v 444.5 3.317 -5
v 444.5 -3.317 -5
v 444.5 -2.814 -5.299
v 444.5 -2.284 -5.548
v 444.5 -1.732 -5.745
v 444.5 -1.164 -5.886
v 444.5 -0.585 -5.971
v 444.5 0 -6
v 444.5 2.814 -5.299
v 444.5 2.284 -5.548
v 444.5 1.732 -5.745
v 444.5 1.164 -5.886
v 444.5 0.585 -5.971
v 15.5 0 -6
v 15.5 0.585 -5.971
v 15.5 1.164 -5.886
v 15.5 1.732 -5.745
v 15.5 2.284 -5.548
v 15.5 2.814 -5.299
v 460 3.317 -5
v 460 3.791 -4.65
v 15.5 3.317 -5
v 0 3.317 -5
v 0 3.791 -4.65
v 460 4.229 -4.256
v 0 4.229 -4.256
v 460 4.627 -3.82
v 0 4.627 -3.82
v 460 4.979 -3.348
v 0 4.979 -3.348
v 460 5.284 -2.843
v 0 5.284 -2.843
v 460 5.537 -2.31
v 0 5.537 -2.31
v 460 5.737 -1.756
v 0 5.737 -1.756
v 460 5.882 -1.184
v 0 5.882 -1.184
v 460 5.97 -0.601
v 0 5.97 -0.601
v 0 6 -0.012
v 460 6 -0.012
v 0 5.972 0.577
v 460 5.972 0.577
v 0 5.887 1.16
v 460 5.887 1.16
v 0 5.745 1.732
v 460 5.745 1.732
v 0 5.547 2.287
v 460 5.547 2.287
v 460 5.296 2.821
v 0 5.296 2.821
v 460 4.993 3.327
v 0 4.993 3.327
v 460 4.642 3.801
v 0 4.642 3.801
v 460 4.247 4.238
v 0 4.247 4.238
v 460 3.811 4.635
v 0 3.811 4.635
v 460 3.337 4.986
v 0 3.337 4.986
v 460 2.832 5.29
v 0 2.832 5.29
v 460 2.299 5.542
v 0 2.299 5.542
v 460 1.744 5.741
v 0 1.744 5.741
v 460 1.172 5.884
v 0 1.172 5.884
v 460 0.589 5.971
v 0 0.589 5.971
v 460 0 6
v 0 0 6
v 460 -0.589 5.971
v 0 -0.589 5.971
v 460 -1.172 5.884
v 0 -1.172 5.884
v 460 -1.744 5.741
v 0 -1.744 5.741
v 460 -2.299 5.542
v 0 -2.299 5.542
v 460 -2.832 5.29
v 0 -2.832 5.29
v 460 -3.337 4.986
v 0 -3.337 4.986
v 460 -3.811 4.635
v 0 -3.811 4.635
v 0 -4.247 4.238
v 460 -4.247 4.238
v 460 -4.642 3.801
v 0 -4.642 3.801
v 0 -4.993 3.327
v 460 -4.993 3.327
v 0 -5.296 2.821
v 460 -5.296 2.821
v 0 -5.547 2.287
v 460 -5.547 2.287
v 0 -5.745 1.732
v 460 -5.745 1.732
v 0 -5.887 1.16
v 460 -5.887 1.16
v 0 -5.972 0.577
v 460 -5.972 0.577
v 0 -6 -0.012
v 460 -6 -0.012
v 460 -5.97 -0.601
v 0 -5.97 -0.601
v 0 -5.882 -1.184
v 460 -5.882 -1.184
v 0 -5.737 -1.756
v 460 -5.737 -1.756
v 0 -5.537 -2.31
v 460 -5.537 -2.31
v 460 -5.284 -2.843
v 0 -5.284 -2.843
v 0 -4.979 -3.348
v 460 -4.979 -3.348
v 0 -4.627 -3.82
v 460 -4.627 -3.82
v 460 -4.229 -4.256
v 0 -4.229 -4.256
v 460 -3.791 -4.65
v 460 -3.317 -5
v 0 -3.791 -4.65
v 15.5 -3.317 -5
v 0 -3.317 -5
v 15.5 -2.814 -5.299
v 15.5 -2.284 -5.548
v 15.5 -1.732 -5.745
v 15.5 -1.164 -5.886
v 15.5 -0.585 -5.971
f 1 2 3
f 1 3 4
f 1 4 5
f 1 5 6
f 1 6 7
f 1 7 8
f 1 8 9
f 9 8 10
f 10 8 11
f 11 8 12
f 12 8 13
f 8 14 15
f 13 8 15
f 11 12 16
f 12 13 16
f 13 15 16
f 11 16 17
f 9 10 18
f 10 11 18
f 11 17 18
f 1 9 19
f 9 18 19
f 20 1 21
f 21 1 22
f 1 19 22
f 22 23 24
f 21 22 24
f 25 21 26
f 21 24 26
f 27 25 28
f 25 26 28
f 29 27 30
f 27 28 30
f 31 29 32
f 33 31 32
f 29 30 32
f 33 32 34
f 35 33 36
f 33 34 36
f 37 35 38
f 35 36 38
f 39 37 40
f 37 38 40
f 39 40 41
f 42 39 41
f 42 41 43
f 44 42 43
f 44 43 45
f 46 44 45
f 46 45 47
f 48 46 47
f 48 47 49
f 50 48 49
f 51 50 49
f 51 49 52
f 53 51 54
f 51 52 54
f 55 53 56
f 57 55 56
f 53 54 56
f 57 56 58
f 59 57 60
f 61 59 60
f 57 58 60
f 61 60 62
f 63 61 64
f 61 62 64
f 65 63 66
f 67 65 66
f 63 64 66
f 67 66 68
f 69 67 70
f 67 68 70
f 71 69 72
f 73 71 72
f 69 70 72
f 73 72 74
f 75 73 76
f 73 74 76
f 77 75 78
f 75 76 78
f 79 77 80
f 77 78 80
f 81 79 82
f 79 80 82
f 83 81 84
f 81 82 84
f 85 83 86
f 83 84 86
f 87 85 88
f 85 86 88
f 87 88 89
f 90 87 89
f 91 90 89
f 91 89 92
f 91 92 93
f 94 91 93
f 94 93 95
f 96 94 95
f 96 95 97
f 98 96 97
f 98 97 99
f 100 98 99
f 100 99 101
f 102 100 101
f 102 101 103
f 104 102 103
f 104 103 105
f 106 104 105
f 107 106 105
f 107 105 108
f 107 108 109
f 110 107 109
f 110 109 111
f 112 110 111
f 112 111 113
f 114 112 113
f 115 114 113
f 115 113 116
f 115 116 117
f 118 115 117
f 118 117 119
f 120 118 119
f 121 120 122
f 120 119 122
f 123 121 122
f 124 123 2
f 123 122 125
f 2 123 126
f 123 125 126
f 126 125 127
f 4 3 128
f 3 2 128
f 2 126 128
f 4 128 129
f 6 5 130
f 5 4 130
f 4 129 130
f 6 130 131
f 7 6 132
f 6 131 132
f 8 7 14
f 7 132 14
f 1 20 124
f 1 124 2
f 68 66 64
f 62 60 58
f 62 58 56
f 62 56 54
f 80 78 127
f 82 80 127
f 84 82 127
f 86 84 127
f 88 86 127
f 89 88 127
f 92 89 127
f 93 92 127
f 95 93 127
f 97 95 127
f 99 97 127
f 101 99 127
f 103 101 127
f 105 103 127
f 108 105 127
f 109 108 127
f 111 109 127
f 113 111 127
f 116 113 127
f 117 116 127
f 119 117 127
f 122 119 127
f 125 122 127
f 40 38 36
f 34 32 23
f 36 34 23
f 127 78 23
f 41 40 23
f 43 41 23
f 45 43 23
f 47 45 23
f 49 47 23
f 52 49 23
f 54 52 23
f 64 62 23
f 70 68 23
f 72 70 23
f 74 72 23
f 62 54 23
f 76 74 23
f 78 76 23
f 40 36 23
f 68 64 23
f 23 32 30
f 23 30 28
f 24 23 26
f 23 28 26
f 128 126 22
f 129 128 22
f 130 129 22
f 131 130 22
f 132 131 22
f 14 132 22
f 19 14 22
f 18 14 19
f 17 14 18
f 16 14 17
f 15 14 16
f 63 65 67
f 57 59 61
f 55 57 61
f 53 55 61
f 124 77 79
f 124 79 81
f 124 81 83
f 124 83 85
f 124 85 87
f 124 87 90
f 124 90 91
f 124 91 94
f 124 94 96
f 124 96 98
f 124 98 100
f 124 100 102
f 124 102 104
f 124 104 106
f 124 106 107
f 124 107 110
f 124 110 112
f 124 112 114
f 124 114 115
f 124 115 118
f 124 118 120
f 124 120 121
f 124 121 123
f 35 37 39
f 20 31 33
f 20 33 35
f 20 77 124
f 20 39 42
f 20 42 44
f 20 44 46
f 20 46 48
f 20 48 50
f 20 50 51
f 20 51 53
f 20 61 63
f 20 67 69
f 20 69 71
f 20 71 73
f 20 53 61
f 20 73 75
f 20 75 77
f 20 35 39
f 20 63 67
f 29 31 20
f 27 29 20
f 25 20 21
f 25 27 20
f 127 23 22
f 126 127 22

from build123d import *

# Parameters (mm, degrees)
SKETCH_1_R          = 6
EXTRUDE_1_DEPTH     = 460
SKETCH_2_W          = 15.5
SKETCH_2_H          = 1
CUT_EXTRUDE_1_DEPTH = 200


with BuildPart() as part:
    # 草图1 → 凸台-拉伸1 (new body)
    with BuildSketch(Plane(origin=(0, 0, 0), x_dir=(0, 0, -1), z_dir=(1, 0, 0))):
        Circle(SKETCH_1_R)
    extrude(amount=EXTRUDE_1_DEPTH)

    # 草图2 → 切除-拉伸1 (cut, symmetric)
    with BuildSketch(Plane(origin=(0, 0, 0), x_dir=(1, 0, 0), z_dir=(0, 1, 0))):
        with Locations((7.75, 5.5)):
            Rectangle(SKETCH_2_W, SKETCH_2_H)
    cut_extrude_1 = extrude(amount=CUT_EXTRUDE_1_DEPTH, both=True, mode=Mode.SUBTRACT)

    # 镜向1: 切除-拉伸1 across plane
    add(cut_extrude_1.mirror(Plane.ZY.offset(-230)), mode=Mode.SUBTRACT)


solid = part.part
